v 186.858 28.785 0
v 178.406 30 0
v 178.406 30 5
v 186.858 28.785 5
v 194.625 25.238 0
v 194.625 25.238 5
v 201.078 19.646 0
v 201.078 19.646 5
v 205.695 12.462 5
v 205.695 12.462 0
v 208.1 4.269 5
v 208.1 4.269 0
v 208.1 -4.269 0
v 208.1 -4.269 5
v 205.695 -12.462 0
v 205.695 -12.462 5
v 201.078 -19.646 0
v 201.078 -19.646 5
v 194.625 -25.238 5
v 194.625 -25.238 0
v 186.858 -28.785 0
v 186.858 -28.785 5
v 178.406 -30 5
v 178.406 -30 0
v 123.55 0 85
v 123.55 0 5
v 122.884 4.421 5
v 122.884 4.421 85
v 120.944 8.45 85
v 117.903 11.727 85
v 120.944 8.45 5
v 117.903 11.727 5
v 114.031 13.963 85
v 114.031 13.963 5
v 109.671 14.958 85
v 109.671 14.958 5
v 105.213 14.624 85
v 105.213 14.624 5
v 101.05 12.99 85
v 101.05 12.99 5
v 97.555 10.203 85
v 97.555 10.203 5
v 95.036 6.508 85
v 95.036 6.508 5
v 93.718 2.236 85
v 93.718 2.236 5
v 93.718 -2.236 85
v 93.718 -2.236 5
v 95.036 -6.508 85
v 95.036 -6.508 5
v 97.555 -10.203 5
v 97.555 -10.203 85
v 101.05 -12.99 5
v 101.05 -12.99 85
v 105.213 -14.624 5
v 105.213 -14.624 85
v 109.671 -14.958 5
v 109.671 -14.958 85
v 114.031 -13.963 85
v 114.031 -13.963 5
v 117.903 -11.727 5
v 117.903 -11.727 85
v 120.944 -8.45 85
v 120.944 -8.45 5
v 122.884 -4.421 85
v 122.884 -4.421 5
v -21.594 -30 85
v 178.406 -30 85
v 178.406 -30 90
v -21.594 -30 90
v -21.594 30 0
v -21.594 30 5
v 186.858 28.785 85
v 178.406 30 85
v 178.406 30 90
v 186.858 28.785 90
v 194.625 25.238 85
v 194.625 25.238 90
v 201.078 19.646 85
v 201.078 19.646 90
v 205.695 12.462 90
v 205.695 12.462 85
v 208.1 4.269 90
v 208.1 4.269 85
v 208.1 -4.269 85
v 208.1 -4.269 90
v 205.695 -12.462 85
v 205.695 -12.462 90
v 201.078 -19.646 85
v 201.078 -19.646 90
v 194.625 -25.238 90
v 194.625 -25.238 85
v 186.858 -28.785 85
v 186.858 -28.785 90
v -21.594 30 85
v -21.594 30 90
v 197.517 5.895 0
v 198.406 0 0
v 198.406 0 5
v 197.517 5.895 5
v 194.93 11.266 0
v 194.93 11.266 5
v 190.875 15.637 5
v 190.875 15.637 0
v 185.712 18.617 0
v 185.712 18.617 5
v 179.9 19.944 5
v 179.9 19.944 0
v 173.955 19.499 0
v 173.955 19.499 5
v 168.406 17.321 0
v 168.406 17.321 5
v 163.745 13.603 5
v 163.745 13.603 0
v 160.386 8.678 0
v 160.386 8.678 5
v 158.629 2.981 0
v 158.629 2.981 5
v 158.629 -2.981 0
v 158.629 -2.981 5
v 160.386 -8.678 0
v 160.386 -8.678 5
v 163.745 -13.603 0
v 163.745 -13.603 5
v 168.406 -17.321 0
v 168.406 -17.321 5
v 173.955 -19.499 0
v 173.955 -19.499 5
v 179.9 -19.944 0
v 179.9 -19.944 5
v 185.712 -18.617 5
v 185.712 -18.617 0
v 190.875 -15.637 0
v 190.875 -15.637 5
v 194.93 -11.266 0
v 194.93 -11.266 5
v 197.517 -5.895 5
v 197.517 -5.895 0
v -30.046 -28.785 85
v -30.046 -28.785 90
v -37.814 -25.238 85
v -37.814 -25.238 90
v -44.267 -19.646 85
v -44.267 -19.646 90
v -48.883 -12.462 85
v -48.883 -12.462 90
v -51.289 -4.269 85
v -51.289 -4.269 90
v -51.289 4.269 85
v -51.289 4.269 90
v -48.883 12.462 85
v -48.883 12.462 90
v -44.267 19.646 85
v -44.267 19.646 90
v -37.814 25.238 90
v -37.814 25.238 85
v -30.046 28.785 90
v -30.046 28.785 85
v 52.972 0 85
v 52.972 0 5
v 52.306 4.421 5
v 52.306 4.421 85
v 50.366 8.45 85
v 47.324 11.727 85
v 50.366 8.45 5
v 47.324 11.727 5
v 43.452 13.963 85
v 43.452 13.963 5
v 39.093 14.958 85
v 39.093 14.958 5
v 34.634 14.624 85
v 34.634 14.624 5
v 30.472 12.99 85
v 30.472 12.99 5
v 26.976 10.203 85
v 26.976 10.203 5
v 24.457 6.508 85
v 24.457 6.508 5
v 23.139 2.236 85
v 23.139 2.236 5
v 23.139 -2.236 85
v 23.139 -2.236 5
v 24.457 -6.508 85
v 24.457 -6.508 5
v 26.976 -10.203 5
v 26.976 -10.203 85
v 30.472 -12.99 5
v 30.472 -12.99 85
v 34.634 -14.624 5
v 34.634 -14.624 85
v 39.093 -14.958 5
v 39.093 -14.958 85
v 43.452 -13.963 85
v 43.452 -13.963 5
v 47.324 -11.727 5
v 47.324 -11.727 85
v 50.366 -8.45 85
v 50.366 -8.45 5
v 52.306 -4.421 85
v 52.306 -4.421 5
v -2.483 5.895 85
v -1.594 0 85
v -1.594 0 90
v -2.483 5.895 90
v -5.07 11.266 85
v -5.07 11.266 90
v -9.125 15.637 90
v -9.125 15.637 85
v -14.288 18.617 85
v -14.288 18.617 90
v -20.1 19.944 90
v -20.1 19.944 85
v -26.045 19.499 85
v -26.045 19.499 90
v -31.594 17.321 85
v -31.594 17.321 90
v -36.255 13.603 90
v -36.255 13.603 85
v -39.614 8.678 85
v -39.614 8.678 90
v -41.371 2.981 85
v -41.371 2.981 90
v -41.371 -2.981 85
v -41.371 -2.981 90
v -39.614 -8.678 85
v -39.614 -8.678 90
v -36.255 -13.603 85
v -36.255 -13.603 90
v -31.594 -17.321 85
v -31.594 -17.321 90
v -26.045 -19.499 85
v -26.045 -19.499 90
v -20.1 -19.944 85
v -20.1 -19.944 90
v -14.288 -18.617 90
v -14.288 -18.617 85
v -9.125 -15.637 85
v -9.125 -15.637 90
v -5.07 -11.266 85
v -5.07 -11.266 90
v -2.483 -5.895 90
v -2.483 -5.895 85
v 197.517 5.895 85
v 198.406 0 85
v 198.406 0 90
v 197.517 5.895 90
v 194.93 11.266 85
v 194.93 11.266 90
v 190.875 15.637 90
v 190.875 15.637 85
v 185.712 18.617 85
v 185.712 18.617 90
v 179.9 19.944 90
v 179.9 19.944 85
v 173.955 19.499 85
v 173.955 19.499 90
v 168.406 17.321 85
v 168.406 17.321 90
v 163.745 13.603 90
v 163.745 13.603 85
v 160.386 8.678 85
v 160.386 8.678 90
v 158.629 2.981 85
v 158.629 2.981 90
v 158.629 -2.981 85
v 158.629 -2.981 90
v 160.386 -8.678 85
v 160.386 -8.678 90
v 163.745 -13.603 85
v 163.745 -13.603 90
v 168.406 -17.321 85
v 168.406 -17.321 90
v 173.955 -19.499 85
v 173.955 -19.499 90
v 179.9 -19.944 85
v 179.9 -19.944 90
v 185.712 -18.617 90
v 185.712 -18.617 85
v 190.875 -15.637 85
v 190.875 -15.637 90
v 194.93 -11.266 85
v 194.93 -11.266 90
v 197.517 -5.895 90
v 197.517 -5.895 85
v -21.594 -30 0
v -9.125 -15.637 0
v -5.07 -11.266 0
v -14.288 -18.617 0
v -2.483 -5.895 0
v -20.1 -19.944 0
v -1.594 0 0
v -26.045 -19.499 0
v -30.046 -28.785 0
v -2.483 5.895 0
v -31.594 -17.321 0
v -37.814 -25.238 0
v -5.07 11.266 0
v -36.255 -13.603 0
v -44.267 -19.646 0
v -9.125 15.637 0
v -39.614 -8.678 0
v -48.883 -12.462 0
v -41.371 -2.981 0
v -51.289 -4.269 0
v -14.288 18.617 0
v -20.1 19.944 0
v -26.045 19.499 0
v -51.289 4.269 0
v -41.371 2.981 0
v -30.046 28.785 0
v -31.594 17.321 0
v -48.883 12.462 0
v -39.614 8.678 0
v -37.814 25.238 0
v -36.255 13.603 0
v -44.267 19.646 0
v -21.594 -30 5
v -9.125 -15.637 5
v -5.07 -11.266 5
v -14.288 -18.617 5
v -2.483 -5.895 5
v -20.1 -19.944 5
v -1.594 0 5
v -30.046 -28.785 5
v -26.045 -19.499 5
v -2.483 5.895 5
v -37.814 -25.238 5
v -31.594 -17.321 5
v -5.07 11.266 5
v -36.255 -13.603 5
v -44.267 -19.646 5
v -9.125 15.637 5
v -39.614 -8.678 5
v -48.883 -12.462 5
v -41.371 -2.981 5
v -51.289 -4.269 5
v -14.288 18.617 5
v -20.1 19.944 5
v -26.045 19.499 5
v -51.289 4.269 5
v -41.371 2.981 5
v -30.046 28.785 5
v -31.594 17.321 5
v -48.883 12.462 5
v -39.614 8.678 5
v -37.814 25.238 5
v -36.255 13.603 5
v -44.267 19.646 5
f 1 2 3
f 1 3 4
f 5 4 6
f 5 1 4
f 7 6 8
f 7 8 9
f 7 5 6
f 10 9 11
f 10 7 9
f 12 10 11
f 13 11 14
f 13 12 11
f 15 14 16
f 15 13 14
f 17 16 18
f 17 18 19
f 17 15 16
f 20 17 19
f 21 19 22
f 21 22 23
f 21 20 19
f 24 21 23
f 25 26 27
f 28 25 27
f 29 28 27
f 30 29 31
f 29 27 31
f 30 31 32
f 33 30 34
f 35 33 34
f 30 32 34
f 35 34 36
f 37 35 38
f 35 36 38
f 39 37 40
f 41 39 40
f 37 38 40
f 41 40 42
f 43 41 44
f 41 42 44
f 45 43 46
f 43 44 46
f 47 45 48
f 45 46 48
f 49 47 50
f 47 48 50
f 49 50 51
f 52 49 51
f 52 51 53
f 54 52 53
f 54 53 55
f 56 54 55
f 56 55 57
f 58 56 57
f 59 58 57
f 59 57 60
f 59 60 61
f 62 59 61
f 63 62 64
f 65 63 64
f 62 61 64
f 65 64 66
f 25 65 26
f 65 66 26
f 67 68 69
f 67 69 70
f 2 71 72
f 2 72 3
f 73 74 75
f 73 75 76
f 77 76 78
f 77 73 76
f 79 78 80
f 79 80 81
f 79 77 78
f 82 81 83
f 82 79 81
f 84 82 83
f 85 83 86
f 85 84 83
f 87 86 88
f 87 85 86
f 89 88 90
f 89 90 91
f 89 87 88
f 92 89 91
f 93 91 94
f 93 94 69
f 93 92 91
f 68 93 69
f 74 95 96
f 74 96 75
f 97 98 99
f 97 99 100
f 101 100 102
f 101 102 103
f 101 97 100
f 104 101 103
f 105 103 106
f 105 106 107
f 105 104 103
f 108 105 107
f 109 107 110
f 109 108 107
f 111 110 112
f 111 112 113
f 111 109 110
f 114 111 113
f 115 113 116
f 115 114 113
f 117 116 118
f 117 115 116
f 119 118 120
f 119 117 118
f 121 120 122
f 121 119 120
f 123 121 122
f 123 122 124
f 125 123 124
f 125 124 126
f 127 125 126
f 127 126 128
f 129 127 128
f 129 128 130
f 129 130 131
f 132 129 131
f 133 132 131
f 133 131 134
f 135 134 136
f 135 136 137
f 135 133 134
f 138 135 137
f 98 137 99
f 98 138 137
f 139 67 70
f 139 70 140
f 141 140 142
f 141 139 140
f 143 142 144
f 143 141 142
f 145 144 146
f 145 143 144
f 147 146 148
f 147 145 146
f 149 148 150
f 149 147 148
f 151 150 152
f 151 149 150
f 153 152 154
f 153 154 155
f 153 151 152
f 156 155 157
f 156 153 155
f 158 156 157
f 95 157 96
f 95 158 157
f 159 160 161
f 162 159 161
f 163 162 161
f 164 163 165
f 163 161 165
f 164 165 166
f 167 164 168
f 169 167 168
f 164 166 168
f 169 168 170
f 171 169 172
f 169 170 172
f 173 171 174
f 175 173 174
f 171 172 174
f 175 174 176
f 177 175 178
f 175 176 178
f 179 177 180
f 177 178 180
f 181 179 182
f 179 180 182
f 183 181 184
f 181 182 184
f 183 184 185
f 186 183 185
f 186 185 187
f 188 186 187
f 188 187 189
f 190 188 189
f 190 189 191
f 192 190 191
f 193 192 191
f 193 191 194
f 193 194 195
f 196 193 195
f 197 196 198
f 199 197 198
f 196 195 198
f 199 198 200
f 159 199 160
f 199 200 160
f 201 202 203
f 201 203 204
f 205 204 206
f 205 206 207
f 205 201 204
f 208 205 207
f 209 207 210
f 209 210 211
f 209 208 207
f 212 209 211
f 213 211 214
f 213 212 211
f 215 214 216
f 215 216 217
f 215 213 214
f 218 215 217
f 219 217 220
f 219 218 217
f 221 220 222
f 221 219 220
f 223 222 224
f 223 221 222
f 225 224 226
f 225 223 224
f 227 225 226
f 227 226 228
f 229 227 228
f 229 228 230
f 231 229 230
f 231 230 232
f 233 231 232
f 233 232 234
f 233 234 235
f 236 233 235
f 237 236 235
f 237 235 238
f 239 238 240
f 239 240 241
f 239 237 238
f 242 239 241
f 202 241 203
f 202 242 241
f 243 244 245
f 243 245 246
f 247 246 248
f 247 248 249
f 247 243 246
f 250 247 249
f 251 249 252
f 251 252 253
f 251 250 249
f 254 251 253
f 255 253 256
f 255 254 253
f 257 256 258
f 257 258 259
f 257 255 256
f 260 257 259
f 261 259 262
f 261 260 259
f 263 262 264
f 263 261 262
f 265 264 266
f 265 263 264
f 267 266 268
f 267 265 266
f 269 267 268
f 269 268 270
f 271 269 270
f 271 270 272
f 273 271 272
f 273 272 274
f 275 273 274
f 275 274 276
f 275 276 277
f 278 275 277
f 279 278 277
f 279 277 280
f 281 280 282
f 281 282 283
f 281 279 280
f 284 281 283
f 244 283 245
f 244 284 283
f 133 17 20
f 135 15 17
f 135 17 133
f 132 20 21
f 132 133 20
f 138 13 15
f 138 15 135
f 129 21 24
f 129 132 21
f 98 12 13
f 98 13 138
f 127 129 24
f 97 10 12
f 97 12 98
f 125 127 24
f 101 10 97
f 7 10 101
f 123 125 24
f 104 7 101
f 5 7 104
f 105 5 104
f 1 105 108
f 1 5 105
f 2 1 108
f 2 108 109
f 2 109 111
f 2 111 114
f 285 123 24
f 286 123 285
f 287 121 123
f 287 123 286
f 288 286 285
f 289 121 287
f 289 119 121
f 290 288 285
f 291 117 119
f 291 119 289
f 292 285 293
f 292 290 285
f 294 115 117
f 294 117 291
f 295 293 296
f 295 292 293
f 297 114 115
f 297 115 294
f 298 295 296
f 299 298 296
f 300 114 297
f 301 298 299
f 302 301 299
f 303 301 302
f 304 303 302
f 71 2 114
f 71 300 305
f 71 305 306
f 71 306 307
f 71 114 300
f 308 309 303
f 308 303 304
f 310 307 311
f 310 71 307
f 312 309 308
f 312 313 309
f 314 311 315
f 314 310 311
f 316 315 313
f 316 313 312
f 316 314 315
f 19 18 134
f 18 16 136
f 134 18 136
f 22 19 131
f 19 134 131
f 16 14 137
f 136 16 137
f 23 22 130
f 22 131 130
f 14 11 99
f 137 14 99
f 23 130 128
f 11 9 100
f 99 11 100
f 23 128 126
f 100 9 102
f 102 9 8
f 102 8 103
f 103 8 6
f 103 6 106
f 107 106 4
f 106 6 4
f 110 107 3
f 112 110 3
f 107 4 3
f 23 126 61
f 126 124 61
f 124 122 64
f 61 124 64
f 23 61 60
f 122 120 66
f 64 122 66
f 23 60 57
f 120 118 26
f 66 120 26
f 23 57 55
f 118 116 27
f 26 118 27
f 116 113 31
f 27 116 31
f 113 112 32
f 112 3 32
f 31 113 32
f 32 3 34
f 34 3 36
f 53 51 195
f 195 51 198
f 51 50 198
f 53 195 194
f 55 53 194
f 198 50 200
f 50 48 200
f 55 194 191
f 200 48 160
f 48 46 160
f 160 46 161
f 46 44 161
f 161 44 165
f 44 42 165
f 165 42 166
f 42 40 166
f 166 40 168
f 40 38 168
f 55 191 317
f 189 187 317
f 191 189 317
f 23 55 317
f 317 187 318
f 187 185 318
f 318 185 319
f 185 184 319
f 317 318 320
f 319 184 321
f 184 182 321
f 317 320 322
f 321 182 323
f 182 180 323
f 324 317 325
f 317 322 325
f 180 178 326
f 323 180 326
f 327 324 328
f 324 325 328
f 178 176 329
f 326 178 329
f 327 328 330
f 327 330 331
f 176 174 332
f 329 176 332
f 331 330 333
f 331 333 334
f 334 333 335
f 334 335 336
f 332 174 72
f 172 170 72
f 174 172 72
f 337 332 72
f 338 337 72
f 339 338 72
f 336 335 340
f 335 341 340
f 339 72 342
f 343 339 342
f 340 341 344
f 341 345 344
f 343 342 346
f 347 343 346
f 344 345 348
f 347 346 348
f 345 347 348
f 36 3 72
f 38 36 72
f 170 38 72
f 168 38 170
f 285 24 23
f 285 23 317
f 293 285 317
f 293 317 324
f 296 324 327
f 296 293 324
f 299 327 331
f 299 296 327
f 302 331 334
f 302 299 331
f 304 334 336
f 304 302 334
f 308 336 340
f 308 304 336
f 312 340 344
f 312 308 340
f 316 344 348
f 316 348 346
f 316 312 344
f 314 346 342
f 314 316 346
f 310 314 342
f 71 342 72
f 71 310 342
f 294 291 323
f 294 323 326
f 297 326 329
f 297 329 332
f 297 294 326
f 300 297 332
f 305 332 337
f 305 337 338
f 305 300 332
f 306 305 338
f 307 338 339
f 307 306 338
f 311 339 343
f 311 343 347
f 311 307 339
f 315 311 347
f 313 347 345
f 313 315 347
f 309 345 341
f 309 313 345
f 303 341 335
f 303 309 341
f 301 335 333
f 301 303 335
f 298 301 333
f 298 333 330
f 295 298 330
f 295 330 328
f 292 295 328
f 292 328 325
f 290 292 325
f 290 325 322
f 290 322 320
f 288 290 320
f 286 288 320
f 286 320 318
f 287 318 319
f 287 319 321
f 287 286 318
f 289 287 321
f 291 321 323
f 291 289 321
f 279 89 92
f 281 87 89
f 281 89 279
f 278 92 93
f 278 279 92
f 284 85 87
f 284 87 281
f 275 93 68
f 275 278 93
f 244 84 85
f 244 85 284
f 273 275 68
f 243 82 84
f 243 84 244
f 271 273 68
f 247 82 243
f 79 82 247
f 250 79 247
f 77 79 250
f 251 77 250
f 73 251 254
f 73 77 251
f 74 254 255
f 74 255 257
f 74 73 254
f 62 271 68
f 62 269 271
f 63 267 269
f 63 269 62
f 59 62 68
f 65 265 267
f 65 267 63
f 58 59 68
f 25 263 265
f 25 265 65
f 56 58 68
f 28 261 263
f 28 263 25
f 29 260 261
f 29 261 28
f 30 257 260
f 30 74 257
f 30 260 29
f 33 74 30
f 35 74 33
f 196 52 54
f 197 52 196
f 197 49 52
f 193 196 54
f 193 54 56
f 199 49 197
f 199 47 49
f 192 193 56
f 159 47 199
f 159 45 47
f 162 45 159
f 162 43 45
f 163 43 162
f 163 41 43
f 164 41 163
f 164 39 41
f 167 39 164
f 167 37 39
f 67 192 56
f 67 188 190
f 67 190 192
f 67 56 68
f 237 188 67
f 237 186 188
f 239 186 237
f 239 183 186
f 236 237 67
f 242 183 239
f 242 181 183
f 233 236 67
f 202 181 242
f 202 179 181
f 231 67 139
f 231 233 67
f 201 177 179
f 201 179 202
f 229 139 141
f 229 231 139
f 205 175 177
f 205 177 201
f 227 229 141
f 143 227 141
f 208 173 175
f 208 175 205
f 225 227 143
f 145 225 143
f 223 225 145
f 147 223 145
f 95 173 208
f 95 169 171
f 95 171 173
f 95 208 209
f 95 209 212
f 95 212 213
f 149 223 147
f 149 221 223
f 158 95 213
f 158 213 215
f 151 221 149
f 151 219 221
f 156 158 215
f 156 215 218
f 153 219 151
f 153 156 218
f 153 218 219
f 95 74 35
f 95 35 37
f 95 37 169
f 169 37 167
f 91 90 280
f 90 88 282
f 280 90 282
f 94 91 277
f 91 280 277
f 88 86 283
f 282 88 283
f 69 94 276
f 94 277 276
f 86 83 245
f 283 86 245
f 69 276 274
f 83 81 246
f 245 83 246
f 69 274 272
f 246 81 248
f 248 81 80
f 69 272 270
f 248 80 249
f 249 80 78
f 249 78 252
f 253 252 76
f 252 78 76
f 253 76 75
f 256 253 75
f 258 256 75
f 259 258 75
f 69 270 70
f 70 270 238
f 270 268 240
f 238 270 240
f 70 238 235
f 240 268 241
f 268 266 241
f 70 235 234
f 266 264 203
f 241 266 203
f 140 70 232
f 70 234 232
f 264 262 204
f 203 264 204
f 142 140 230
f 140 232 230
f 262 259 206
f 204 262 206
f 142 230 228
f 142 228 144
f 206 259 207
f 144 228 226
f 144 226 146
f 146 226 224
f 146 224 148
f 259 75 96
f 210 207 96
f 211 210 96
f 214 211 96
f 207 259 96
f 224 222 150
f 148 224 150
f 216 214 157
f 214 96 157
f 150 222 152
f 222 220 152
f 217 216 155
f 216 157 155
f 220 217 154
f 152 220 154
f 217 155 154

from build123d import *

# Parameters (mm, degrees)
SKETCH_1_R             = 20
EXTRUDE_3_DEPTH        = 5
SKETCH_5_R             = 15
EXTRUDE_4_DEPTH        = 80
PATTERN_LINEAR_2_COUNT = 2
PATTERN_LINEAR_2_PITCH = 85


with BuildPart() as part:
    # 草图1 → 凸台-拉伸3 (new body)
    with BuildSketch(Plane.XY):
        with BuildLine():
            Line((-21.594339623, 30), (178.405660377, 30))
            ThreePointArc((178.405660377, 30), (208.405660377, 0), (178.405660377, -30))
            Line((178.405660377, -30), (-21.594339623, -30))
            ThreePointArc((-21.594339623, -30), (-51.594339623, 0), (-21.594339623, 30))
        make_face()
        with Locations((178.405660377, 0)):
            Circle(SKETCH_1_R, mode=Mode.SUBTRACT)
        with Locations((-21.594339623, 0)):
            Circle(SKETCH_1_R, mode=Mode.SUBTRACT)
    extrude_3 = extrude(amount=EXTRUDE_3_DEPTH)

    # 草图5 → 凸台-拉伸4 (add)
    with BuildSketch(Plane.XY.offset(5)):
        with Locations((37.971935237, 0)):
            Circle(SKETCH_5_R)
        with Locations((108.550446531, 0)):
            Circle(SKETCH_5_R)
    extrude(amount=EXTRUDE_4_DEPTH)

    # 阵列(线性)2: 凸台-拉伸3 ×2
    with Locations(*[(0, 0, i * PATTERN_LINEAR_2_PITCH) for i in range(1, PATTERN_LINEAR_2_COUNT)]):
        add(extrude_3)


solid = part.part
